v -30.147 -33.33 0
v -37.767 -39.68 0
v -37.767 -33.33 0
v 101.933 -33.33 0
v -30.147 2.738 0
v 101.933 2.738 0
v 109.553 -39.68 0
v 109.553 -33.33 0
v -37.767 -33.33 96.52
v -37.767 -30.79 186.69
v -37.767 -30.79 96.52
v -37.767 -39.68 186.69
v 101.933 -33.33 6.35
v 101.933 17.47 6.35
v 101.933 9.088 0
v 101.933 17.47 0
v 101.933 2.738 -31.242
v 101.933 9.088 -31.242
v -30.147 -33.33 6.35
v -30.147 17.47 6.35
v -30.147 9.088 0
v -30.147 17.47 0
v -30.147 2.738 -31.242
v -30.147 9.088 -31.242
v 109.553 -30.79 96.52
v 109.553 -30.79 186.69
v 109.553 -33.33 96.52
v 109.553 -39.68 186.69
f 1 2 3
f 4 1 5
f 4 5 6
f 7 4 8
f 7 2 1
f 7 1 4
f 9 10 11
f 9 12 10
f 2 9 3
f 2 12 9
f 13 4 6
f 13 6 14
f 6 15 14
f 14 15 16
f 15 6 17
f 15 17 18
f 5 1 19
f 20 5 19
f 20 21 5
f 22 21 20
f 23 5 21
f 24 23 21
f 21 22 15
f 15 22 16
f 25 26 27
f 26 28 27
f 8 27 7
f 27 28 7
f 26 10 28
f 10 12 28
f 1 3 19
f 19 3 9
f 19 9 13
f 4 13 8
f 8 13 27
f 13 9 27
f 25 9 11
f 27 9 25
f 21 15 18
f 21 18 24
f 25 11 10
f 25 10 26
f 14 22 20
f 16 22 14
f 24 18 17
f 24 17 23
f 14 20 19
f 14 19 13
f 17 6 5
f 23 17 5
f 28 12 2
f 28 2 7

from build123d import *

# Parameters (mm, degrees)
SKETCH1_W           = 132.08
SKETCH1_H           = 57.15
BOSS_EXTRUDE1_DEPTH = 6.35
SKETCH2_W           = 132.08
SKETCH2_H           = 6.35
BOSS_EXTRUDE2_DEPTH = 31.242
SKETCH3_W           = 132.08
SKETCH3_H           = 6.35
BOSS_EXTRUDE3_DEPTH = 180.34
SKETCH4_W           = 7.62
SKETCH4_H           = 186.69
BOSS_EXTRUDE4_DEPTH = 6.35
SKETCH5_W           = 147.32
SKETCH5_H           = 90.17
BOSS_EXTRUDE5_DEPTH = 2.54


with BuildPart() as part:
    # Sketch1 → Boss-Extrude1 (new body)
    with BuildSketch(Plane.XY):
        with Locations((35.892678297, -11.105284376)):
            Rectangle(SKETCH1_W, SKETCH1_H)
    extrude(amount=BOSS_EXTRUDE1_DEPTH)

    # Sketch2 → Boss-Extrude2 (add)
    with BuildSketch(Plane(origin=(0, 0, 0), x_dir=(-1, 0, 0), z_dir=(0, 0, -1))):
        with Locations((-35.892678297, 5.912715624)):
            Rectangle(SKETCH2_W, SKETCH2_H)
    extrude(amount=BOSS_EXTRUDE2_DEPTH)

    # Sketch3 → Boss-Extrude3 (add)
    with BuildSketch(Plane.XY.offset(6.35)):
        with Locations((35.892678297, -36.505284376)):
            Rectangle(SKETCH3_W, SKETCH3_H)
    extrude(amount=BOSS_EXTRUDE3_DEPTH)

    # Sketch4 → Boss-Extrude4 (add)
    with BuildSketch(Plane.XZ.offset(39.680284376)):
        with Locations((-33.957321703, 93.345)):
            Rectangle(SKETCH4_W, SKETCH4_H)
        with Locations((105.742678297, 93.345)):
            Rectangle(SKETCH4_W, SKETCH4_H)
    extrude(amount=-BOSS_EXTRUDE4_DEPTH)

    # Sketch5 → Boss-Extrude5 (add)
    with BuildSketch(Plane(origin=(0, -33.330284376, 0), x_dir=(1, 0, 0), z_dir=(0, 1, 0))):
        with Locations((35.892678297, -141.605)):
            Rectangle(SKETCH5_W, SKETCH5_H)
    extrude(amount=BOSS_EXTRUDE5_DEPTH)


solid = part.part
